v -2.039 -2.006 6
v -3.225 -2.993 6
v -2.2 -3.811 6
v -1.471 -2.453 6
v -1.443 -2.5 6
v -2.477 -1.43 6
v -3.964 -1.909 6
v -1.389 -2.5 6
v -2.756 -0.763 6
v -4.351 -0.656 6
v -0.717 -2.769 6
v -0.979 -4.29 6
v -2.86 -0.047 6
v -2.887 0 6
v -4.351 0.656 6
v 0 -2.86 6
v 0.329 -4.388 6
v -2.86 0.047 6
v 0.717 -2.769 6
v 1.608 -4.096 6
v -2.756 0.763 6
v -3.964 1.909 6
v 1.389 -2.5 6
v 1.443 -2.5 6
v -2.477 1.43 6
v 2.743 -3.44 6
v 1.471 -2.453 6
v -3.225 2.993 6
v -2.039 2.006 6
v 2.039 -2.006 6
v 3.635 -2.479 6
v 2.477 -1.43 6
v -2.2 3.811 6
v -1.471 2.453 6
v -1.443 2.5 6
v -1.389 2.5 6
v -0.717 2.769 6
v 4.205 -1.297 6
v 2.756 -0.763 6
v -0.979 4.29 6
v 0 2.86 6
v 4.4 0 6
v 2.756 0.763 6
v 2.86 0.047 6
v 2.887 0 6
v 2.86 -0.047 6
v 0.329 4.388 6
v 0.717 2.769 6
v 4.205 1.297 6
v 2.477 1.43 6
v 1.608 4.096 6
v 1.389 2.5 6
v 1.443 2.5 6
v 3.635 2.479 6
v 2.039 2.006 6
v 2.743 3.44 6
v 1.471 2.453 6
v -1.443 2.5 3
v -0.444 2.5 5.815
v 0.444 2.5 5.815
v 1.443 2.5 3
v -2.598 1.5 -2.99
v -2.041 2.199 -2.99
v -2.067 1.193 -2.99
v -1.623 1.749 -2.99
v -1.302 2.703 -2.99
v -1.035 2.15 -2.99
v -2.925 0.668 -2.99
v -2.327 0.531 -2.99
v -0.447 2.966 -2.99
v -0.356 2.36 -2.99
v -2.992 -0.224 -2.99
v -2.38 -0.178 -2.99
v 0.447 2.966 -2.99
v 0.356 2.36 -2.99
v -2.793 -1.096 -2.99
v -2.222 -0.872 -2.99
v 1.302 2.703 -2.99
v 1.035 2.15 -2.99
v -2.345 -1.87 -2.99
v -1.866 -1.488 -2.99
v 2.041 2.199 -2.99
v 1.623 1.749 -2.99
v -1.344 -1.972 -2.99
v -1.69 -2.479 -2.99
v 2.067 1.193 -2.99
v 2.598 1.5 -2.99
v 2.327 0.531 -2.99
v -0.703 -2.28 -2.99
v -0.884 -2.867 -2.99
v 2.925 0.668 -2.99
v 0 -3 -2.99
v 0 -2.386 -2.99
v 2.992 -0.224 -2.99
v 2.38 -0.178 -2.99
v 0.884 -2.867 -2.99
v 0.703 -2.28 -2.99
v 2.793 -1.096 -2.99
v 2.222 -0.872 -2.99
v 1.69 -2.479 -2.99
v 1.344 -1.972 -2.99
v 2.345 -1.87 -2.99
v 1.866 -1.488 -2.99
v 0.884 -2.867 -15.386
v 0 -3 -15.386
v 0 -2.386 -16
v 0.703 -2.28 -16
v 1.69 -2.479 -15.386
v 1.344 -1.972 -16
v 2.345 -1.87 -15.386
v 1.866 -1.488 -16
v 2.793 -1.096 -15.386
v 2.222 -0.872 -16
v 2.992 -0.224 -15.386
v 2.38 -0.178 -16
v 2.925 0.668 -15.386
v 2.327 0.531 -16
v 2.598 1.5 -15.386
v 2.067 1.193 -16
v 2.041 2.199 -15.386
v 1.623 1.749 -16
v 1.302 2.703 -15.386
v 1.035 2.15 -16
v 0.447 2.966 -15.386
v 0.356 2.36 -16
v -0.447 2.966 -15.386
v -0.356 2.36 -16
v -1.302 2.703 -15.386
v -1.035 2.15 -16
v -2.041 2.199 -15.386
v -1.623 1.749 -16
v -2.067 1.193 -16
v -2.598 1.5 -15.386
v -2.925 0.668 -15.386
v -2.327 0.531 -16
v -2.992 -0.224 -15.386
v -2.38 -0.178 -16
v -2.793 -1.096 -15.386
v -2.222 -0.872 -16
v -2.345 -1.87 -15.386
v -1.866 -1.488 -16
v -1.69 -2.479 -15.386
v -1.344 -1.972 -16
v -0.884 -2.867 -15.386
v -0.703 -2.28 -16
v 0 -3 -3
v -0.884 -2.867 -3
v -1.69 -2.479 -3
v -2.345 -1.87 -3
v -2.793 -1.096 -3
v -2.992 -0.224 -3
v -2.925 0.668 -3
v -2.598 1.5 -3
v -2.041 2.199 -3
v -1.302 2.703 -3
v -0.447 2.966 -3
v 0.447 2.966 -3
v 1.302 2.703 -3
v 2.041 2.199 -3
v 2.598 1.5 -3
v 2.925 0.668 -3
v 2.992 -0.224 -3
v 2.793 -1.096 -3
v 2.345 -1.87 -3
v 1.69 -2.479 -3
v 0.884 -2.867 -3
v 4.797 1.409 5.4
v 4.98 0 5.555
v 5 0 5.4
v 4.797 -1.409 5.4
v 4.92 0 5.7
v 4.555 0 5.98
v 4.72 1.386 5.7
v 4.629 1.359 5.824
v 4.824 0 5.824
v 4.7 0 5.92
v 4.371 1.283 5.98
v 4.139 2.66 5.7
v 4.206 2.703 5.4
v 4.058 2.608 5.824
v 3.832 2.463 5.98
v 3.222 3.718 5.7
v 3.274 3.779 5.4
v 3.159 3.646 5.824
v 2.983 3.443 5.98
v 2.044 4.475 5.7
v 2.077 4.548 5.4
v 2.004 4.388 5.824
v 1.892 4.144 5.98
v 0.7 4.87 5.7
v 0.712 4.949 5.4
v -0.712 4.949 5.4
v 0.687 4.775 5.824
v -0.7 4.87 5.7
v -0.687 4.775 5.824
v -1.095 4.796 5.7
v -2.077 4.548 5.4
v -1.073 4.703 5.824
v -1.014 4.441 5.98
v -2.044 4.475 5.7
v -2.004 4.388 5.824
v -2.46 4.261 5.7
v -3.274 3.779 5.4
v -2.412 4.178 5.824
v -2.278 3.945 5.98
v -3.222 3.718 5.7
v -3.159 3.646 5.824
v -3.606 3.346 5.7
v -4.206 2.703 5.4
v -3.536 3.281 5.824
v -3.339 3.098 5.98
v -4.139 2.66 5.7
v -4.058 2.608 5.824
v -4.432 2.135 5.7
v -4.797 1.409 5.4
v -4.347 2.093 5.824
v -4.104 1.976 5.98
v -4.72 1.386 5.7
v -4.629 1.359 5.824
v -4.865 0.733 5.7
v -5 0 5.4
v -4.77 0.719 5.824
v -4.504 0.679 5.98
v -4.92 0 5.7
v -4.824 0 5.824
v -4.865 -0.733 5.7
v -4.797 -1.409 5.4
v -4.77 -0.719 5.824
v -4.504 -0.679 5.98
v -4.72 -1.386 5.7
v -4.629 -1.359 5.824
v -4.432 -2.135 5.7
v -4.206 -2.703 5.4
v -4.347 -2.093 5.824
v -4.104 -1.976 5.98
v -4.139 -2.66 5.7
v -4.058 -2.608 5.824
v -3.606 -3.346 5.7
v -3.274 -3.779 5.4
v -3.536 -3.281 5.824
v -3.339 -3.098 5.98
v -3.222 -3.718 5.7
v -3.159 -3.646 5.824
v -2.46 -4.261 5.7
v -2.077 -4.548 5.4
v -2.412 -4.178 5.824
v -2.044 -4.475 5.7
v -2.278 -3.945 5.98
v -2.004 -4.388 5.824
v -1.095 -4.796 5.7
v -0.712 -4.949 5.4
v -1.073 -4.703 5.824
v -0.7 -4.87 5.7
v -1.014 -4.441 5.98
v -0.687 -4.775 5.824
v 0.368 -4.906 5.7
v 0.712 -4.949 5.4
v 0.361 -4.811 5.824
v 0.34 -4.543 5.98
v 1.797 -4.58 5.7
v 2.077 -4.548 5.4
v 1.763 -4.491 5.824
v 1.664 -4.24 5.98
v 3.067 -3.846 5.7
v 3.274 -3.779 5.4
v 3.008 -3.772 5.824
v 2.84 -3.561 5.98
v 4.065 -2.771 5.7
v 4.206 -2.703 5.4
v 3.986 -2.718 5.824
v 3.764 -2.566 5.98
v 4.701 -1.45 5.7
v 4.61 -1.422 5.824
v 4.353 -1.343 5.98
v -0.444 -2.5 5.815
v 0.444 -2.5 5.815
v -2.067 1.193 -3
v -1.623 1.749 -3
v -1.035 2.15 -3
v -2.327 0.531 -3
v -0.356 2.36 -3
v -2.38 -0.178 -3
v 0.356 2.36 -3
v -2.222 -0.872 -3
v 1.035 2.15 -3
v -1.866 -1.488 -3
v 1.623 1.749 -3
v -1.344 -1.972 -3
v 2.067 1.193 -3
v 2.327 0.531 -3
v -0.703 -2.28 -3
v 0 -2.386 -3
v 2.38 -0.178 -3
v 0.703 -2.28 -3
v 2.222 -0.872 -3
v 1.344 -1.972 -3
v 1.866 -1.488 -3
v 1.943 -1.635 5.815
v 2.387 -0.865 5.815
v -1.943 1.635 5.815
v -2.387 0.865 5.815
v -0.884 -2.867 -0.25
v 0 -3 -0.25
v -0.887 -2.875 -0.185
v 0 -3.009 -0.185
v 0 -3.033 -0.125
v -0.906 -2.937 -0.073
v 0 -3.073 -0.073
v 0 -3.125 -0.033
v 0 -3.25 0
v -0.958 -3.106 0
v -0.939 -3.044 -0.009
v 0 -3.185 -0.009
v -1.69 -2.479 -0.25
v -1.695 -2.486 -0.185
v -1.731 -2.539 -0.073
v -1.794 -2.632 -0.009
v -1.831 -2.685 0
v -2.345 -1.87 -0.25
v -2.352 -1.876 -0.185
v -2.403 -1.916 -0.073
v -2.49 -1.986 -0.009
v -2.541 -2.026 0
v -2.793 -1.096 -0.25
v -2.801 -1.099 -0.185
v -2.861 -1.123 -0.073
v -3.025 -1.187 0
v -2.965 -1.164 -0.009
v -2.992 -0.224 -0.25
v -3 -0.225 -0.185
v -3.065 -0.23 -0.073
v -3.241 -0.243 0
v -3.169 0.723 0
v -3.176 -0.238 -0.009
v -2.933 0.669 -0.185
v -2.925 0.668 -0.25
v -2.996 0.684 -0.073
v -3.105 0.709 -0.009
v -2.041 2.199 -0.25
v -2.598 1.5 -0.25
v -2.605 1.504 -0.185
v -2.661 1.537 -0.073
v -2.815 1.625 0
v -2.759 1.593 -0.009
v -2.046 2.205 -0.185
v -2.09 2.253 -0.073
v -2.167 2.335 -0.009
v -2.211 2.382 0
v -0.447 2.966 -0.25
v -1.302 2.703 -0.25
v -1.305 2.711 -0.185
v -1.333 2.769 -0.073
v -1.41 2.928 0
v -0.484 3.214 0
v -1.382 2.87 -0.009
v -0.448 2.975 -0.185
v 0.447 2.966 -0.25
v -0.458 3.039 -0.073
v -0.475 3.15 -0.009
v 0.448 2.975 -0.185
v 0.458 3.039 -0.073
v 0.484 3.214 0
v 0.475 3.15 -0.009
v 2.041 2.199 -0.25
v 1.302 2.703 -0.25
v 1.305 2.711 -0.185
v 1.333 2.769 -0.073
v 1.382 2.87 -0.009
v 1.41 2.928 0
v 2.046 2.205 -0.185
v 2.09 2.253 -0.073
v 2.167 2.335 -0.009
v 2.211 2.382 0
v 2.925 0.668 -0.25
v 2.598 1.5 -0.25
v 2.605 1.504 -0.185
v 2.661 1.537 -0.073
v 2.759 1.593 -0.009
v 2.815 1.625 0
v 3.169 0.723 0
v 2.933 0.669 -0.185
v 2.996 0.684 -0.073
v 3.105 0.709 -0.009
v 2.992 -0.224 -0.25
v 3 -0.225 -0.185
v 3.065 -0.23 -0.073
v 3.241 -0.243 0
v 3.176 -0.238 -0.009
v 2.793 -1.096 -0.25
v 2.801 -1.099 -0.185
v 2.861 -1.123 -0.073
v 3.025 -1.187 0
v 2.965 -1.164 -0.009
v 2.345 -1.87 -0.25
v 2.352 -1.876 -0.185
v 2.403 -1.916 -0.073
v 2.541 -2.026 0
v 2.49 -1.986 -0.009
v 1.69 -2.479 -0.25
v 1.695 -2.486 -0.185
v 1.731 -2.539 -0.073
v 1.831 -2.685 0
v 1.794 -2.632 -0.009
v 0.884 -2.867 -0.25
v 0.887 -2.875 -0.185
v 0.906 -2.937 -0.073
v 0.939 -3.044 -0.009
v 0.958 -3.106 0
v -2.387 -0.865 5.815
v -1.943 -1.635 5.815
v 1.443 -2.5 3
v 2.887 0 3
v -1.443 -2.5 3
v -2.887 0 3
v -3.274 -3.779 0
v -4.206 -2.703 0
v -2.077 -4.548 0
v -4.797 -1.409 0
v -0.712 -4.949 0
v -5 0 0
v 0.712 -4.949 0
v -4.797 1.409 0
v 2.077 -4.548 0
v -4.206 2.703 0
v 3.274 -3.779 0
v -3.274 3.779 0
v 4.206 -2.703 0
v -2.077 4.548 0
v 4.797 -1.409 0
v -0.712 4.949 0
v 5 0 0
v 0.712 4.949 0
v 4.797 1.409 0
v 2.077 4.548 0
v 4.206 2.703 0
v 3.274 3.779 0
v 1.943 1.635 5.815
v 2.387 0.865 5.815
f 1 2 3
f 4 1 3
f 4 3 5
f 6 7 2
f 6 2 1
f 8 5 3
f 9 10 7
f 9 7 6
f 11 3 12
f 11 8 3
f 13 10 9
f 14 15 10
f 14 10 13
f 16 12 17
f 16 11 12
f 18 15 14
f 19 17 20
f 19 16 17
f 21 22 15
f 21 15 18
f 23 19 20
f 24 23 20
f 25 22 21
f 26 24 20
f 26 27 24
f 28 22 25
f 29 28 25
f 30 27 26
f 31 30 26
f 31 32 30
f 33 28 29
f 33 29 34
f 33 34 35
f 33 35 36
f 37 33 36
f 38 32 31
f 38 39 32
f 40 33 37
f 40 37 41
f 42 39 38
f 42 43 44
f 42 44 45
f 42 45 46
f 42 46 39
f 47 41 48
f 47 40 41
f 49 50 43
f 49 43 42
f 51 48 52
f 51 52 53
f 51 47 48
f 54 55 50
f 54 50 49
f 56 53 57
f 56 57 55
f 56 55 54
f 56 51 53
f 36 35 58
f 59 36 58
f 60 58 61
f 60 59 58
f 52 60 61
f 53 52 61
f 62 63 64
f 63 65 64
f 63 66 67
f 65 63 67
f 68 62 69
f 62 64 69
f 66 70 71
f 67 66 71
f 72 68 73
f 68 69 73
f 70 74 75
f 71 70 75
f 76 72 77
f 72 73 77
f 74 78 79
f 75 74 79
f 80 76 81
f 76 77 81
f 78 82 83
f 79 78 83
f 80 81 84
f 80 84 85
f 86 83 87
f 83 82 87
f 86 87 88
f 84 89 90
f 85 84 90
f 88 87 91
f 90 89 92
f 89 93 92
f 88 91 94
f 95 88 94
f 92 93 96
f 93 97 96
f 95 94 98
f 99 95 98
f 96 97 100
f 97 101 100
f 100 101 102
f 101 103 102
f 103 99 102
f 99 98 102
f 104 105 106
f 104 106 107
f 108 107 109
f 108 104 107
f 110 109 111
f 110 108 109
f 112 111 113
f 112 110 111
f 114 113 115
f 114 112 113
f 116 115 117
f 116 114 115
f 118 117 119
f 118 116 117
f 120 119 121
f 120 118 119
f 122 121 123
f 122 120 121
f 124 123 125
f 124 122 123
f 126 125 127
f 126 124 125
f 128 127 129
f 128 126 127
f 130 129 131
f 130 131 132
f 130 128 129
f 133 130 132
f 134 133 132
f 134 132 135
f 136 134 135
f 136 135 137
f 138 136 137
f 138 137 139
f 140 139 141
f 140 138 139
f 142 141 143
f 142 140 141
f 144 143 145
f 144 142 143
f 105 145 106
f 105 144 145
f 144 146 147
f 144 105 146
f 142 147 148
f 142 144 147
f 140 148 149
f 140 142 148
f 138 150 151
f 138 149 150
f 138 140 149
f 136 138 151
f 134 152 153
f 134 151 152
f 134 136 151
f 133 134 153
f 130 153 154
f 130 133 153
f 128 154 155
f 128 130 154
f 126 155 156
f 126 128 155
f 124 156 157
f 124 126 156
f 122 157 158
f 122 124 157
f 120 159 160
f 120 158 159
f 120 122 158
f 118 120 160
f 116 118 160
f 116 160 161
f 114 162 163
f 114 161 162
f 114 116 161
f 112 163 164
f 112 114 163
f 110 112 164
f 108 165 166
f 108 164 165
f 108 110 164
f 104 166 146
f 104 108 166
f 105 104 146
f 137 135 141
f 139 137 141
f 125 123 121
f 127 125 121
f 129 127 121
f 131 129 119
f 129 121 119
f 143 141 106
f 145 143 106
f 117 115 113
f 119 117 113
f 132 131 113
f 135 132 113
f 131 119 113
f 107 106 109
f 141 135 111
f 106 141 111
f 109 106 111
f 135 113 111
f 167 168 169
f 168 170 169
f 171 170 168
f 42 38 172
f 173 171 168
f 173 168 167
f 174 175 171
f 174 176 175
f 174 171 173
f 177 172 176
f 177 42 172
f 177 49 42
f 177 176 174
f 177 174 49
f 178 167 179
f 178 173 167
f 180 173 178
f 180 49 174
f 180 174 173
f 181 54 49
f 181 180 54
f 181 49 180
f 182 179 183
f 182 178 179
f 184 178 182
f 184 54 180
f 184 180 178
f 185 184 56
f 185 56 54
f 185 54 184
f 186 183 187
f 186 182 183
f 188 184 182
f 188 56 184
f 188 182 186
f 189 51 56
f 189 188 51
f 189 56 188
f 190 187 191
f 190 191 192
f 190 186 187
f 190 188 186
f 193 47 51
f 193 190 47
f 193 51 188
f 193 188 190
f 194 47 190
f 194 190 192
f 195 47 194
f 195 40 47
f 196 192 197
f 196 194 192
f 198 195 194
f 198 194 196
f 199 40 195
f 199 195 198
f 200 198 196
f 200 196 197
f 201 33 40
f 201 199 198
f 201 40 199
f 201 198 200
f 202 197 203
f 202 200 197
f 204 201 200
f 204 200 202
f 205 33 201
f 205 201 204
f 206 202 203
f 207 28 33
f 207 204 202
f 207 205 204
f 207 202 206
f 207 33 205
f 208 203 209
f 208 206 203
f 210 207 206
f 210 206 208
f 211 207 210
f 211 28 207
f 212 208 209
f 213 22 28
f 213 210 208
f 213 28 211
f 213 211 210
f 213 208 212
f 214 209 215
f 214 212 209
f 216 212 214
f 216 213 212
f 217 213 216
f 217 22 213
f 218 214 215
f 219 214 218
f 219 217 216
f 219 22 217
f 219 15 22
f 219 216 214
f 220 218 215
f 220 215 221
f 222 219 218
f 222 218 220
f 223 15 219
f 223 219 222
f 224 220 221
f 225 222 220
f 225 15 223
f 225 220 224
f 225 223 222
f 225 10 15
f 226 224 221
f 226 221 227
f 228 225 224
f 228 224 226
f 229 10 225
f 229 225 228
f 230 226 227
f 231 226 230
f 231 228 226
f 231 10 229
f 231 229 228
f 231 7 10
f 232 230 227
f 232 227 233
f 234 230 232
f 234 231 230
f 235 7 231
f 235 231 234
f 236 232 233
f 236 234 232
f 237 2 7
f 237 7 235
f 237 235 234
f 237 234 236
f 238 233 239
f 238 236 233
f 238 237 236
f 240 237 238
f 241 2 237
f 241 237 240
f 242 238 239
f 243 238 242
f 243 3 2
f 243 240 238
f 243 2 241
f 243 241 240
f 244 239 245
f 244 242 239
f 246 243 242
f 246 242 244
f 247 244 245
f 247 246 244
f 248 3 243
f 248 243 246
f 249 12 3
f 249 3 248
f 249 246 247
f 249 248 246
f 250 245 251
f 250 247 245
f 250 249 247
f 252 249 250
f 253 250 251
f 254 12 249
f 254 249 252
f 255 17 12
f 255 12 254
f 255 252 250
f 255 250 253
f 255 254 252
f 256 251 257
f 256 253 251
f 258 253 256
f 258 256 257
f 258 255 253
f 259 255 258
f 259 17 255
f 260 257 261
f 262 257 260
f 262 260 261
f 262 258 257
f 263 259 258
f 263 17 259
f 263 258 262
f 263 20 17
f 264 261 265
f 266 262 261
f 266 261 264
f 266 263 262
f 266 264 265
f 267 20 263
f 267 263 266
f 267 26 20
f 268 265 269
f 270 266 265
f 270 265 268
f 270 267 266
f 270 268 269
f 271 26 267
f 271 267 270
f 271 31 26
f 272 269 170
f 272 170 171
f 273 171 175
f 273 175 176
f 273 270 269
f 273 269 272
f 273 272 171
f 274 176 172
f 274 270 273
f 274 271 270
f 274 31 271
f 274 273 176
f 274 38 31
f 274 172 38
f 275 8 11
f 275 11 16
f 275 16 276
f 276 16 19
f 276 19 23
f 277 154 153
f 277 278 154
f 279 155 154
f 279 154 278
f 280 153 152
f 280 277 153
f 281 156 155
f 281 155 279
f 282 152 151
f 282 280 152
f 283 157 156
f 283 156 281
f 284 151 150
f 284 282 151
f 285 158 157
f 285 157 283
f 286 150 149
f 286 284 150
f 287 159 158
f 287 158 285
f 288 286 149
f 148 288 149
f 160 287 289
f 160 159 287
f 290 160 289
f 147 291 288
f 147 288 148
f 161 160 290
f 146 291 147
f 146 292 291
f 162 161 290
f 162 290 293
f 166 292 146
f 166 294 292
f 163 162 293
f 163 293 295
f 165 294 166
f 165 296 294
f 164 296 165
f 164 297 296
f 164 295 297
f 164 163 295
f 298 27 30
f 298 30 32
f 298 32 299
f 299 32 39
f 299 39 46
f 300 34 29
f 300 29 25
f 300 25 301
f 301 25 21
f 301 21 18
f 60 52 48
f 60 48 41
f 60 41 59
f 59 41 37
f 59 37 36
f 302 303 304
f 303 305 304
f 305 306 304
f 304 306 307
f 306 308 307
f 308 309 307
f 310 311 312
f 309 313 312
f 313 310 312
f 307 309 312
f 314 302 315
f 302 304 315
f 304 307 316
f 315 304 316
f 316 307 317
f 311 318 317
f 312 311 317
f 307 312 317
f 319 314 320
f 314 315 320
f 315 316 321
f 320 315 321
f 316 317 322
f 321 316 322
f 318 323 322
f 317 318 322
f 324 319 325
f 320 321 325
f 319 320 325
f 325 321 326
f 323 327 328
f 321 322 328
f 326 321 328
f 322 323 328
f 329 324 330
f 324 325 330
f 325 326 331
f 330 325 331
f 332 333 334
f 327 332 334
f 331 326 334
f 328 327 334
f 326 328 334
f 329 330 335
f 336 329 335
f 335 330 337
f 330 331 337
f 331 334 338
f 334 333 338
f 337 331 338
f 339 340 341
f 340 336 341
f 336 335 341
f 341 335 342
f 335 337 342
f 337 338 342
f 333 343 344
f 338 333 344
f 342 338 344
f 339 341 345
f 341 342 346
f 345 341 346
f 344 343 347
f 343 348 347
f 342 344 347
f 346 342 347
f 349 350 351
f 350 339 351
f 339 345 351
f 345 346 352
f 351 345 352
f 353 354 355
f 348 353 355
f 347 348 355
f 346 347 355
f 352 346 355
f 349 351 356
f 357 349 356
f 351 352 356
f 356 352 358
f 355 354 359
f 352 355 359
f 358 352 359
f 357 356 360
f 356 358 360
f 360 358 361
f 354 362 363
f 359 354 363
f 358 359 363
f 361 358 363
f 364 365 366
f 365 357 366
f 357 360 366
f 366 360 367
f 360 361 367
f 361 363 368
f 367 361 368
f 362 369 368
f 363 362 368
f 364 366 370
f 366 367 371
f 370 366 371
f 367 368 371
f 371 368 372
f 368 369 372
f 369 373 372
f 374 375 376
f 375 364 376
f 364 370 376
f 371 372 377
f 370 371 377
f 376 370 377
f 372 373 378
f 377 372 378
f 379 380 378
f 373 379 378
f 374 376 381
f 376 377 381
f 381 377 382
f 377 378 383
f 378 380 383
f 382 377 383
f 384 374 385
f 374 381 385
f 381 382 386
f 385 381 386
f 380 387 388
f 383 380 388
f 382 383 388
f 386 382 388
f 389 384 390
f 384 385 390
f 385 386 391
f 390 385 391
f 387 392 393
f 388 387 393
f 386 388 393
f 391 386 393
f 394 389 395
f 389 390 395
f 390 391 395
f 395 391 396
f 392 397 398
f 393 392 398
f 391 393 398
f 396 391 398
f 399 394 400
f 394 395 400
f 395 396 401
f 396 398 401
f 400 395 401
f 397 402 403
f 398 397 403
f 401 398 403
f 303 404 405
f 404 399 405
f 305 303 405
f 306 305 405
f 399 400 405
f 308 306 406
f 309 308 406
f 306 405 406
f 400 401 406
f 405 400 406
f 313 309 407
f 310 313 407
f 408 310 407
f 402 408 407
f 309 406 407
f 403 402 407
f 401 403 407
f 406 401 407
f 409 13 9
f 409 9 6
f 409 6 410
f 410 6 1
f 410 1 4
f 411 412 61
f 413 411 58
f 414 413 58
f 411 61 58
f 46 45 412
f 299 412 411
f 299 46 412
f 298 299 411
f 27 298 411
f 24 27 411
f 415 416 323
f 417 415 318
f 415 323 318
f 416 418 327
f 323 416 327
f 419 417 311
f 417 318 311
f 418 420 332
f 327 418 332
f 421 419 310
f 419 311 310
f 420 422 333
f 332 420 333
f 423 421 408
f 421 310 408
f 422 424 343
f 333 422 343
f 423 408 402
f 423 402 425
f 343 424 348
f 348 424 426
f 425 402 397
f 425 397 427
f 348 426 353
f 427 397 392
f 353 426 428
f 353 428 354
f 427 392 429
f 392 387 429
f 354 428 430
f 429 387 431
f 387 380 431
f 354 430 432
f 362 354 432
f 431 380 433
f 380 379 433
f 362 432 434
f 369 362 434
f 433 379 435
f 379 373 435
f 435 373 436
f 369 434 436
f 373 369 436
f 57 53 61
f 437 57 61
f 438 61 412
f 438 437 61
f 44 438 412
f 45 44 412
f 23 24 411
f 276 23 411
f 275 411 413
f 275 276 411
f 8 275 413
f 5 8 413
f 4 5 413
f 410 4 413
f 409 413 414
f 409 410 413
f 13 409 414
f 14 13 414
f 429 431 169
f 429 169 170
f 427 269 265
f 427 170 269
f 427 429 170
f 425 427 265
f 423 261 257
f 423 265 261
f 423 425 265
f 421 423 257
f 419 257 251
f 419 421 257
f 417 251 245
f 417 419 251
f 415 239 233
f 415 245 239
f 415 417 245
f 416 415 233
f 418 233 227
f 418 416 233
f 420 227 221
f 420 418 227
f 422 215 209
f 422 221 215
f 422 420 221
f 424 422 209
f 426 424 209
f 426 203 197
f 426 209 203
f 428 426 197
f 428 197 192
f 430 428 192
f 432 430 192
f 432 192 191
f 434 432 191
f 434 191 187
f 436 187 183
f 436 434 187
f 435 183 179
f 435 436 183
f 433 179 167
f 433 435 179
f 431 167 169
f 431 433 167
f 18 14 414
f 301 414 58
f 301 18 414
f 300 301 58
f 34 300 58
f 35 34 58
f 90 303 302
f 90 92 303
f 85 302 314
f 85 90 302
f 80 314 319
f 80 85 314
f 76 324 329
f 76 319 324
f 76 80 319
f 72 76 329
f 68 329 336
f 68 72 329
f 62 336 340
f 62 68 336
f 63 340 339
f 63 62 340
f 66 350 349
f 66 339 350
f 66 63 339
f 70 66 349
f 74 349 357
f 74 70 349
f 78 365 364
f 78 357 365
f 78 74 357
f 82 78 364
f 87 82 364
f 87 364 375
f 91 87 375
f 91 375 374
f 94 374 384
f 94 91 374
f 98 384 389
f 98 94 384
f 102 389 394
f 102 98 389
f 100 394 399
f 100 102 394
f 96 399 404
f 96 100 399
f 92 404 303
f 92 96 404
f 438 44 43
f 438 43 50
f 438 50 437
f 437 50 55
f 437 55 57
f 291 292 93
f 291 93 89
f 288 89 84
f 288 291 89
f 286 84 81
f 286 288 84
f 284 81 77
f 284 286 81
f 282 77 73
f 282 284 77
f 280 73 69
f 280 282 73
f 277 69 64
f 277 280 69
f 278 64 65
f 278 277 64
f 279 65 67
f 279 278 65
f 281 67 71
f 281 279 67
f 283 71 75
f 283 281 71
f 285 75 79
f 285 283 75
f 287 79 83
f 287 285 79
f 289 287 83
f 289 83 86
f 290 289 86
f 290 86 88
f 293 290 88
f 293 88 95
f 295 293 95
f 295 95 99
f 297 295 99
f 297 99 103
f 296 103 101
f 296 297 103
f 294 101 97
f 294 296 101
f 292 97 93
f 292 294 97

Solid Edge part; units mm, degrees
sketch "Sketch1" plane through (0, 0, 0) normal (0, 0, 1) x (1, 0, 0)
  circle A0 centre (0, 0) radius 5
extrude "Protrusion1" add sketch "Sketch1" along normal blind 6
sketch "Sketch2" plane through (0, 0, 6) normal (0, 0, 1) x (0, 1, 0)
  line L0 (0, 2.8868) -> (2.5, 1.4434)
  line L1 (2.5, 1.4434) -> (2.5, -1.4434)
  line L2 (2.5, -1.4434) -> (0, -2.8868)
  line L3 (0, -2.8868) -> (-2.5, -1.4434)
  line L4 (-2.5, -1.4434) -> (-2.5, 1.4434)
  line L5 (-2.5, 1.4434) -> (0, 2.8868)
extrude "Cutout1" cut sketch "Sketch2" against normal blind 3
fillet "Round1" radius 0.6 1 edges at (-5, 0, 6)
sketch "Sketch3" plane through (0, 0, 0) normal (1, 0, 0) x (0, 1, 0)
  line L0 (-2.3865, -16) -> (0, -16)
  line L1 (-3, -15.3865) -> (-2.3865, -16)
  line L2 (-3, -3) -> (-3, -15.3865)
  line L3 (-2.3865, -3) -> (-3, -3)
  line L4 (-2.3865, -2.99) -> (-2.3865, -3)
  line L5 (-3, -2.99) -> (-2.3865, -2.99)
  line L6 (-3, -0.25) -> (-3, -2.99)
  arc A0 (-3, -0.25) -> (-3.25, 0) centre (-3.25, -0.25) ccw
  dimension "D1" = 3
  dimension "D2" = 0.01
  dimension "D3" = 0.25
  dimension "D4" = 16
revolve "RevolvedProtrusion1" add sketch "Sketch3" angle 360 about axis through (0, 0, -60.325) along (0, 0, 1) material side at (0, -1.1932, -15.95)
cosmetic_thread "Thread1"
sketch "Sketch4" plane through (0, 0, 0) normal (0, -1, 0) x (1, 0, 0)
  line L0 (-2.86, 6) -> (0, 4.3488)
revolve "RevolvedCutout1" cut sketch "Sketch4" angle 360 about axis through (0, 0, 57.15) along (0, 0, -1) material side at (-1.405, 0, 5.2177)
properties material "Steel"
